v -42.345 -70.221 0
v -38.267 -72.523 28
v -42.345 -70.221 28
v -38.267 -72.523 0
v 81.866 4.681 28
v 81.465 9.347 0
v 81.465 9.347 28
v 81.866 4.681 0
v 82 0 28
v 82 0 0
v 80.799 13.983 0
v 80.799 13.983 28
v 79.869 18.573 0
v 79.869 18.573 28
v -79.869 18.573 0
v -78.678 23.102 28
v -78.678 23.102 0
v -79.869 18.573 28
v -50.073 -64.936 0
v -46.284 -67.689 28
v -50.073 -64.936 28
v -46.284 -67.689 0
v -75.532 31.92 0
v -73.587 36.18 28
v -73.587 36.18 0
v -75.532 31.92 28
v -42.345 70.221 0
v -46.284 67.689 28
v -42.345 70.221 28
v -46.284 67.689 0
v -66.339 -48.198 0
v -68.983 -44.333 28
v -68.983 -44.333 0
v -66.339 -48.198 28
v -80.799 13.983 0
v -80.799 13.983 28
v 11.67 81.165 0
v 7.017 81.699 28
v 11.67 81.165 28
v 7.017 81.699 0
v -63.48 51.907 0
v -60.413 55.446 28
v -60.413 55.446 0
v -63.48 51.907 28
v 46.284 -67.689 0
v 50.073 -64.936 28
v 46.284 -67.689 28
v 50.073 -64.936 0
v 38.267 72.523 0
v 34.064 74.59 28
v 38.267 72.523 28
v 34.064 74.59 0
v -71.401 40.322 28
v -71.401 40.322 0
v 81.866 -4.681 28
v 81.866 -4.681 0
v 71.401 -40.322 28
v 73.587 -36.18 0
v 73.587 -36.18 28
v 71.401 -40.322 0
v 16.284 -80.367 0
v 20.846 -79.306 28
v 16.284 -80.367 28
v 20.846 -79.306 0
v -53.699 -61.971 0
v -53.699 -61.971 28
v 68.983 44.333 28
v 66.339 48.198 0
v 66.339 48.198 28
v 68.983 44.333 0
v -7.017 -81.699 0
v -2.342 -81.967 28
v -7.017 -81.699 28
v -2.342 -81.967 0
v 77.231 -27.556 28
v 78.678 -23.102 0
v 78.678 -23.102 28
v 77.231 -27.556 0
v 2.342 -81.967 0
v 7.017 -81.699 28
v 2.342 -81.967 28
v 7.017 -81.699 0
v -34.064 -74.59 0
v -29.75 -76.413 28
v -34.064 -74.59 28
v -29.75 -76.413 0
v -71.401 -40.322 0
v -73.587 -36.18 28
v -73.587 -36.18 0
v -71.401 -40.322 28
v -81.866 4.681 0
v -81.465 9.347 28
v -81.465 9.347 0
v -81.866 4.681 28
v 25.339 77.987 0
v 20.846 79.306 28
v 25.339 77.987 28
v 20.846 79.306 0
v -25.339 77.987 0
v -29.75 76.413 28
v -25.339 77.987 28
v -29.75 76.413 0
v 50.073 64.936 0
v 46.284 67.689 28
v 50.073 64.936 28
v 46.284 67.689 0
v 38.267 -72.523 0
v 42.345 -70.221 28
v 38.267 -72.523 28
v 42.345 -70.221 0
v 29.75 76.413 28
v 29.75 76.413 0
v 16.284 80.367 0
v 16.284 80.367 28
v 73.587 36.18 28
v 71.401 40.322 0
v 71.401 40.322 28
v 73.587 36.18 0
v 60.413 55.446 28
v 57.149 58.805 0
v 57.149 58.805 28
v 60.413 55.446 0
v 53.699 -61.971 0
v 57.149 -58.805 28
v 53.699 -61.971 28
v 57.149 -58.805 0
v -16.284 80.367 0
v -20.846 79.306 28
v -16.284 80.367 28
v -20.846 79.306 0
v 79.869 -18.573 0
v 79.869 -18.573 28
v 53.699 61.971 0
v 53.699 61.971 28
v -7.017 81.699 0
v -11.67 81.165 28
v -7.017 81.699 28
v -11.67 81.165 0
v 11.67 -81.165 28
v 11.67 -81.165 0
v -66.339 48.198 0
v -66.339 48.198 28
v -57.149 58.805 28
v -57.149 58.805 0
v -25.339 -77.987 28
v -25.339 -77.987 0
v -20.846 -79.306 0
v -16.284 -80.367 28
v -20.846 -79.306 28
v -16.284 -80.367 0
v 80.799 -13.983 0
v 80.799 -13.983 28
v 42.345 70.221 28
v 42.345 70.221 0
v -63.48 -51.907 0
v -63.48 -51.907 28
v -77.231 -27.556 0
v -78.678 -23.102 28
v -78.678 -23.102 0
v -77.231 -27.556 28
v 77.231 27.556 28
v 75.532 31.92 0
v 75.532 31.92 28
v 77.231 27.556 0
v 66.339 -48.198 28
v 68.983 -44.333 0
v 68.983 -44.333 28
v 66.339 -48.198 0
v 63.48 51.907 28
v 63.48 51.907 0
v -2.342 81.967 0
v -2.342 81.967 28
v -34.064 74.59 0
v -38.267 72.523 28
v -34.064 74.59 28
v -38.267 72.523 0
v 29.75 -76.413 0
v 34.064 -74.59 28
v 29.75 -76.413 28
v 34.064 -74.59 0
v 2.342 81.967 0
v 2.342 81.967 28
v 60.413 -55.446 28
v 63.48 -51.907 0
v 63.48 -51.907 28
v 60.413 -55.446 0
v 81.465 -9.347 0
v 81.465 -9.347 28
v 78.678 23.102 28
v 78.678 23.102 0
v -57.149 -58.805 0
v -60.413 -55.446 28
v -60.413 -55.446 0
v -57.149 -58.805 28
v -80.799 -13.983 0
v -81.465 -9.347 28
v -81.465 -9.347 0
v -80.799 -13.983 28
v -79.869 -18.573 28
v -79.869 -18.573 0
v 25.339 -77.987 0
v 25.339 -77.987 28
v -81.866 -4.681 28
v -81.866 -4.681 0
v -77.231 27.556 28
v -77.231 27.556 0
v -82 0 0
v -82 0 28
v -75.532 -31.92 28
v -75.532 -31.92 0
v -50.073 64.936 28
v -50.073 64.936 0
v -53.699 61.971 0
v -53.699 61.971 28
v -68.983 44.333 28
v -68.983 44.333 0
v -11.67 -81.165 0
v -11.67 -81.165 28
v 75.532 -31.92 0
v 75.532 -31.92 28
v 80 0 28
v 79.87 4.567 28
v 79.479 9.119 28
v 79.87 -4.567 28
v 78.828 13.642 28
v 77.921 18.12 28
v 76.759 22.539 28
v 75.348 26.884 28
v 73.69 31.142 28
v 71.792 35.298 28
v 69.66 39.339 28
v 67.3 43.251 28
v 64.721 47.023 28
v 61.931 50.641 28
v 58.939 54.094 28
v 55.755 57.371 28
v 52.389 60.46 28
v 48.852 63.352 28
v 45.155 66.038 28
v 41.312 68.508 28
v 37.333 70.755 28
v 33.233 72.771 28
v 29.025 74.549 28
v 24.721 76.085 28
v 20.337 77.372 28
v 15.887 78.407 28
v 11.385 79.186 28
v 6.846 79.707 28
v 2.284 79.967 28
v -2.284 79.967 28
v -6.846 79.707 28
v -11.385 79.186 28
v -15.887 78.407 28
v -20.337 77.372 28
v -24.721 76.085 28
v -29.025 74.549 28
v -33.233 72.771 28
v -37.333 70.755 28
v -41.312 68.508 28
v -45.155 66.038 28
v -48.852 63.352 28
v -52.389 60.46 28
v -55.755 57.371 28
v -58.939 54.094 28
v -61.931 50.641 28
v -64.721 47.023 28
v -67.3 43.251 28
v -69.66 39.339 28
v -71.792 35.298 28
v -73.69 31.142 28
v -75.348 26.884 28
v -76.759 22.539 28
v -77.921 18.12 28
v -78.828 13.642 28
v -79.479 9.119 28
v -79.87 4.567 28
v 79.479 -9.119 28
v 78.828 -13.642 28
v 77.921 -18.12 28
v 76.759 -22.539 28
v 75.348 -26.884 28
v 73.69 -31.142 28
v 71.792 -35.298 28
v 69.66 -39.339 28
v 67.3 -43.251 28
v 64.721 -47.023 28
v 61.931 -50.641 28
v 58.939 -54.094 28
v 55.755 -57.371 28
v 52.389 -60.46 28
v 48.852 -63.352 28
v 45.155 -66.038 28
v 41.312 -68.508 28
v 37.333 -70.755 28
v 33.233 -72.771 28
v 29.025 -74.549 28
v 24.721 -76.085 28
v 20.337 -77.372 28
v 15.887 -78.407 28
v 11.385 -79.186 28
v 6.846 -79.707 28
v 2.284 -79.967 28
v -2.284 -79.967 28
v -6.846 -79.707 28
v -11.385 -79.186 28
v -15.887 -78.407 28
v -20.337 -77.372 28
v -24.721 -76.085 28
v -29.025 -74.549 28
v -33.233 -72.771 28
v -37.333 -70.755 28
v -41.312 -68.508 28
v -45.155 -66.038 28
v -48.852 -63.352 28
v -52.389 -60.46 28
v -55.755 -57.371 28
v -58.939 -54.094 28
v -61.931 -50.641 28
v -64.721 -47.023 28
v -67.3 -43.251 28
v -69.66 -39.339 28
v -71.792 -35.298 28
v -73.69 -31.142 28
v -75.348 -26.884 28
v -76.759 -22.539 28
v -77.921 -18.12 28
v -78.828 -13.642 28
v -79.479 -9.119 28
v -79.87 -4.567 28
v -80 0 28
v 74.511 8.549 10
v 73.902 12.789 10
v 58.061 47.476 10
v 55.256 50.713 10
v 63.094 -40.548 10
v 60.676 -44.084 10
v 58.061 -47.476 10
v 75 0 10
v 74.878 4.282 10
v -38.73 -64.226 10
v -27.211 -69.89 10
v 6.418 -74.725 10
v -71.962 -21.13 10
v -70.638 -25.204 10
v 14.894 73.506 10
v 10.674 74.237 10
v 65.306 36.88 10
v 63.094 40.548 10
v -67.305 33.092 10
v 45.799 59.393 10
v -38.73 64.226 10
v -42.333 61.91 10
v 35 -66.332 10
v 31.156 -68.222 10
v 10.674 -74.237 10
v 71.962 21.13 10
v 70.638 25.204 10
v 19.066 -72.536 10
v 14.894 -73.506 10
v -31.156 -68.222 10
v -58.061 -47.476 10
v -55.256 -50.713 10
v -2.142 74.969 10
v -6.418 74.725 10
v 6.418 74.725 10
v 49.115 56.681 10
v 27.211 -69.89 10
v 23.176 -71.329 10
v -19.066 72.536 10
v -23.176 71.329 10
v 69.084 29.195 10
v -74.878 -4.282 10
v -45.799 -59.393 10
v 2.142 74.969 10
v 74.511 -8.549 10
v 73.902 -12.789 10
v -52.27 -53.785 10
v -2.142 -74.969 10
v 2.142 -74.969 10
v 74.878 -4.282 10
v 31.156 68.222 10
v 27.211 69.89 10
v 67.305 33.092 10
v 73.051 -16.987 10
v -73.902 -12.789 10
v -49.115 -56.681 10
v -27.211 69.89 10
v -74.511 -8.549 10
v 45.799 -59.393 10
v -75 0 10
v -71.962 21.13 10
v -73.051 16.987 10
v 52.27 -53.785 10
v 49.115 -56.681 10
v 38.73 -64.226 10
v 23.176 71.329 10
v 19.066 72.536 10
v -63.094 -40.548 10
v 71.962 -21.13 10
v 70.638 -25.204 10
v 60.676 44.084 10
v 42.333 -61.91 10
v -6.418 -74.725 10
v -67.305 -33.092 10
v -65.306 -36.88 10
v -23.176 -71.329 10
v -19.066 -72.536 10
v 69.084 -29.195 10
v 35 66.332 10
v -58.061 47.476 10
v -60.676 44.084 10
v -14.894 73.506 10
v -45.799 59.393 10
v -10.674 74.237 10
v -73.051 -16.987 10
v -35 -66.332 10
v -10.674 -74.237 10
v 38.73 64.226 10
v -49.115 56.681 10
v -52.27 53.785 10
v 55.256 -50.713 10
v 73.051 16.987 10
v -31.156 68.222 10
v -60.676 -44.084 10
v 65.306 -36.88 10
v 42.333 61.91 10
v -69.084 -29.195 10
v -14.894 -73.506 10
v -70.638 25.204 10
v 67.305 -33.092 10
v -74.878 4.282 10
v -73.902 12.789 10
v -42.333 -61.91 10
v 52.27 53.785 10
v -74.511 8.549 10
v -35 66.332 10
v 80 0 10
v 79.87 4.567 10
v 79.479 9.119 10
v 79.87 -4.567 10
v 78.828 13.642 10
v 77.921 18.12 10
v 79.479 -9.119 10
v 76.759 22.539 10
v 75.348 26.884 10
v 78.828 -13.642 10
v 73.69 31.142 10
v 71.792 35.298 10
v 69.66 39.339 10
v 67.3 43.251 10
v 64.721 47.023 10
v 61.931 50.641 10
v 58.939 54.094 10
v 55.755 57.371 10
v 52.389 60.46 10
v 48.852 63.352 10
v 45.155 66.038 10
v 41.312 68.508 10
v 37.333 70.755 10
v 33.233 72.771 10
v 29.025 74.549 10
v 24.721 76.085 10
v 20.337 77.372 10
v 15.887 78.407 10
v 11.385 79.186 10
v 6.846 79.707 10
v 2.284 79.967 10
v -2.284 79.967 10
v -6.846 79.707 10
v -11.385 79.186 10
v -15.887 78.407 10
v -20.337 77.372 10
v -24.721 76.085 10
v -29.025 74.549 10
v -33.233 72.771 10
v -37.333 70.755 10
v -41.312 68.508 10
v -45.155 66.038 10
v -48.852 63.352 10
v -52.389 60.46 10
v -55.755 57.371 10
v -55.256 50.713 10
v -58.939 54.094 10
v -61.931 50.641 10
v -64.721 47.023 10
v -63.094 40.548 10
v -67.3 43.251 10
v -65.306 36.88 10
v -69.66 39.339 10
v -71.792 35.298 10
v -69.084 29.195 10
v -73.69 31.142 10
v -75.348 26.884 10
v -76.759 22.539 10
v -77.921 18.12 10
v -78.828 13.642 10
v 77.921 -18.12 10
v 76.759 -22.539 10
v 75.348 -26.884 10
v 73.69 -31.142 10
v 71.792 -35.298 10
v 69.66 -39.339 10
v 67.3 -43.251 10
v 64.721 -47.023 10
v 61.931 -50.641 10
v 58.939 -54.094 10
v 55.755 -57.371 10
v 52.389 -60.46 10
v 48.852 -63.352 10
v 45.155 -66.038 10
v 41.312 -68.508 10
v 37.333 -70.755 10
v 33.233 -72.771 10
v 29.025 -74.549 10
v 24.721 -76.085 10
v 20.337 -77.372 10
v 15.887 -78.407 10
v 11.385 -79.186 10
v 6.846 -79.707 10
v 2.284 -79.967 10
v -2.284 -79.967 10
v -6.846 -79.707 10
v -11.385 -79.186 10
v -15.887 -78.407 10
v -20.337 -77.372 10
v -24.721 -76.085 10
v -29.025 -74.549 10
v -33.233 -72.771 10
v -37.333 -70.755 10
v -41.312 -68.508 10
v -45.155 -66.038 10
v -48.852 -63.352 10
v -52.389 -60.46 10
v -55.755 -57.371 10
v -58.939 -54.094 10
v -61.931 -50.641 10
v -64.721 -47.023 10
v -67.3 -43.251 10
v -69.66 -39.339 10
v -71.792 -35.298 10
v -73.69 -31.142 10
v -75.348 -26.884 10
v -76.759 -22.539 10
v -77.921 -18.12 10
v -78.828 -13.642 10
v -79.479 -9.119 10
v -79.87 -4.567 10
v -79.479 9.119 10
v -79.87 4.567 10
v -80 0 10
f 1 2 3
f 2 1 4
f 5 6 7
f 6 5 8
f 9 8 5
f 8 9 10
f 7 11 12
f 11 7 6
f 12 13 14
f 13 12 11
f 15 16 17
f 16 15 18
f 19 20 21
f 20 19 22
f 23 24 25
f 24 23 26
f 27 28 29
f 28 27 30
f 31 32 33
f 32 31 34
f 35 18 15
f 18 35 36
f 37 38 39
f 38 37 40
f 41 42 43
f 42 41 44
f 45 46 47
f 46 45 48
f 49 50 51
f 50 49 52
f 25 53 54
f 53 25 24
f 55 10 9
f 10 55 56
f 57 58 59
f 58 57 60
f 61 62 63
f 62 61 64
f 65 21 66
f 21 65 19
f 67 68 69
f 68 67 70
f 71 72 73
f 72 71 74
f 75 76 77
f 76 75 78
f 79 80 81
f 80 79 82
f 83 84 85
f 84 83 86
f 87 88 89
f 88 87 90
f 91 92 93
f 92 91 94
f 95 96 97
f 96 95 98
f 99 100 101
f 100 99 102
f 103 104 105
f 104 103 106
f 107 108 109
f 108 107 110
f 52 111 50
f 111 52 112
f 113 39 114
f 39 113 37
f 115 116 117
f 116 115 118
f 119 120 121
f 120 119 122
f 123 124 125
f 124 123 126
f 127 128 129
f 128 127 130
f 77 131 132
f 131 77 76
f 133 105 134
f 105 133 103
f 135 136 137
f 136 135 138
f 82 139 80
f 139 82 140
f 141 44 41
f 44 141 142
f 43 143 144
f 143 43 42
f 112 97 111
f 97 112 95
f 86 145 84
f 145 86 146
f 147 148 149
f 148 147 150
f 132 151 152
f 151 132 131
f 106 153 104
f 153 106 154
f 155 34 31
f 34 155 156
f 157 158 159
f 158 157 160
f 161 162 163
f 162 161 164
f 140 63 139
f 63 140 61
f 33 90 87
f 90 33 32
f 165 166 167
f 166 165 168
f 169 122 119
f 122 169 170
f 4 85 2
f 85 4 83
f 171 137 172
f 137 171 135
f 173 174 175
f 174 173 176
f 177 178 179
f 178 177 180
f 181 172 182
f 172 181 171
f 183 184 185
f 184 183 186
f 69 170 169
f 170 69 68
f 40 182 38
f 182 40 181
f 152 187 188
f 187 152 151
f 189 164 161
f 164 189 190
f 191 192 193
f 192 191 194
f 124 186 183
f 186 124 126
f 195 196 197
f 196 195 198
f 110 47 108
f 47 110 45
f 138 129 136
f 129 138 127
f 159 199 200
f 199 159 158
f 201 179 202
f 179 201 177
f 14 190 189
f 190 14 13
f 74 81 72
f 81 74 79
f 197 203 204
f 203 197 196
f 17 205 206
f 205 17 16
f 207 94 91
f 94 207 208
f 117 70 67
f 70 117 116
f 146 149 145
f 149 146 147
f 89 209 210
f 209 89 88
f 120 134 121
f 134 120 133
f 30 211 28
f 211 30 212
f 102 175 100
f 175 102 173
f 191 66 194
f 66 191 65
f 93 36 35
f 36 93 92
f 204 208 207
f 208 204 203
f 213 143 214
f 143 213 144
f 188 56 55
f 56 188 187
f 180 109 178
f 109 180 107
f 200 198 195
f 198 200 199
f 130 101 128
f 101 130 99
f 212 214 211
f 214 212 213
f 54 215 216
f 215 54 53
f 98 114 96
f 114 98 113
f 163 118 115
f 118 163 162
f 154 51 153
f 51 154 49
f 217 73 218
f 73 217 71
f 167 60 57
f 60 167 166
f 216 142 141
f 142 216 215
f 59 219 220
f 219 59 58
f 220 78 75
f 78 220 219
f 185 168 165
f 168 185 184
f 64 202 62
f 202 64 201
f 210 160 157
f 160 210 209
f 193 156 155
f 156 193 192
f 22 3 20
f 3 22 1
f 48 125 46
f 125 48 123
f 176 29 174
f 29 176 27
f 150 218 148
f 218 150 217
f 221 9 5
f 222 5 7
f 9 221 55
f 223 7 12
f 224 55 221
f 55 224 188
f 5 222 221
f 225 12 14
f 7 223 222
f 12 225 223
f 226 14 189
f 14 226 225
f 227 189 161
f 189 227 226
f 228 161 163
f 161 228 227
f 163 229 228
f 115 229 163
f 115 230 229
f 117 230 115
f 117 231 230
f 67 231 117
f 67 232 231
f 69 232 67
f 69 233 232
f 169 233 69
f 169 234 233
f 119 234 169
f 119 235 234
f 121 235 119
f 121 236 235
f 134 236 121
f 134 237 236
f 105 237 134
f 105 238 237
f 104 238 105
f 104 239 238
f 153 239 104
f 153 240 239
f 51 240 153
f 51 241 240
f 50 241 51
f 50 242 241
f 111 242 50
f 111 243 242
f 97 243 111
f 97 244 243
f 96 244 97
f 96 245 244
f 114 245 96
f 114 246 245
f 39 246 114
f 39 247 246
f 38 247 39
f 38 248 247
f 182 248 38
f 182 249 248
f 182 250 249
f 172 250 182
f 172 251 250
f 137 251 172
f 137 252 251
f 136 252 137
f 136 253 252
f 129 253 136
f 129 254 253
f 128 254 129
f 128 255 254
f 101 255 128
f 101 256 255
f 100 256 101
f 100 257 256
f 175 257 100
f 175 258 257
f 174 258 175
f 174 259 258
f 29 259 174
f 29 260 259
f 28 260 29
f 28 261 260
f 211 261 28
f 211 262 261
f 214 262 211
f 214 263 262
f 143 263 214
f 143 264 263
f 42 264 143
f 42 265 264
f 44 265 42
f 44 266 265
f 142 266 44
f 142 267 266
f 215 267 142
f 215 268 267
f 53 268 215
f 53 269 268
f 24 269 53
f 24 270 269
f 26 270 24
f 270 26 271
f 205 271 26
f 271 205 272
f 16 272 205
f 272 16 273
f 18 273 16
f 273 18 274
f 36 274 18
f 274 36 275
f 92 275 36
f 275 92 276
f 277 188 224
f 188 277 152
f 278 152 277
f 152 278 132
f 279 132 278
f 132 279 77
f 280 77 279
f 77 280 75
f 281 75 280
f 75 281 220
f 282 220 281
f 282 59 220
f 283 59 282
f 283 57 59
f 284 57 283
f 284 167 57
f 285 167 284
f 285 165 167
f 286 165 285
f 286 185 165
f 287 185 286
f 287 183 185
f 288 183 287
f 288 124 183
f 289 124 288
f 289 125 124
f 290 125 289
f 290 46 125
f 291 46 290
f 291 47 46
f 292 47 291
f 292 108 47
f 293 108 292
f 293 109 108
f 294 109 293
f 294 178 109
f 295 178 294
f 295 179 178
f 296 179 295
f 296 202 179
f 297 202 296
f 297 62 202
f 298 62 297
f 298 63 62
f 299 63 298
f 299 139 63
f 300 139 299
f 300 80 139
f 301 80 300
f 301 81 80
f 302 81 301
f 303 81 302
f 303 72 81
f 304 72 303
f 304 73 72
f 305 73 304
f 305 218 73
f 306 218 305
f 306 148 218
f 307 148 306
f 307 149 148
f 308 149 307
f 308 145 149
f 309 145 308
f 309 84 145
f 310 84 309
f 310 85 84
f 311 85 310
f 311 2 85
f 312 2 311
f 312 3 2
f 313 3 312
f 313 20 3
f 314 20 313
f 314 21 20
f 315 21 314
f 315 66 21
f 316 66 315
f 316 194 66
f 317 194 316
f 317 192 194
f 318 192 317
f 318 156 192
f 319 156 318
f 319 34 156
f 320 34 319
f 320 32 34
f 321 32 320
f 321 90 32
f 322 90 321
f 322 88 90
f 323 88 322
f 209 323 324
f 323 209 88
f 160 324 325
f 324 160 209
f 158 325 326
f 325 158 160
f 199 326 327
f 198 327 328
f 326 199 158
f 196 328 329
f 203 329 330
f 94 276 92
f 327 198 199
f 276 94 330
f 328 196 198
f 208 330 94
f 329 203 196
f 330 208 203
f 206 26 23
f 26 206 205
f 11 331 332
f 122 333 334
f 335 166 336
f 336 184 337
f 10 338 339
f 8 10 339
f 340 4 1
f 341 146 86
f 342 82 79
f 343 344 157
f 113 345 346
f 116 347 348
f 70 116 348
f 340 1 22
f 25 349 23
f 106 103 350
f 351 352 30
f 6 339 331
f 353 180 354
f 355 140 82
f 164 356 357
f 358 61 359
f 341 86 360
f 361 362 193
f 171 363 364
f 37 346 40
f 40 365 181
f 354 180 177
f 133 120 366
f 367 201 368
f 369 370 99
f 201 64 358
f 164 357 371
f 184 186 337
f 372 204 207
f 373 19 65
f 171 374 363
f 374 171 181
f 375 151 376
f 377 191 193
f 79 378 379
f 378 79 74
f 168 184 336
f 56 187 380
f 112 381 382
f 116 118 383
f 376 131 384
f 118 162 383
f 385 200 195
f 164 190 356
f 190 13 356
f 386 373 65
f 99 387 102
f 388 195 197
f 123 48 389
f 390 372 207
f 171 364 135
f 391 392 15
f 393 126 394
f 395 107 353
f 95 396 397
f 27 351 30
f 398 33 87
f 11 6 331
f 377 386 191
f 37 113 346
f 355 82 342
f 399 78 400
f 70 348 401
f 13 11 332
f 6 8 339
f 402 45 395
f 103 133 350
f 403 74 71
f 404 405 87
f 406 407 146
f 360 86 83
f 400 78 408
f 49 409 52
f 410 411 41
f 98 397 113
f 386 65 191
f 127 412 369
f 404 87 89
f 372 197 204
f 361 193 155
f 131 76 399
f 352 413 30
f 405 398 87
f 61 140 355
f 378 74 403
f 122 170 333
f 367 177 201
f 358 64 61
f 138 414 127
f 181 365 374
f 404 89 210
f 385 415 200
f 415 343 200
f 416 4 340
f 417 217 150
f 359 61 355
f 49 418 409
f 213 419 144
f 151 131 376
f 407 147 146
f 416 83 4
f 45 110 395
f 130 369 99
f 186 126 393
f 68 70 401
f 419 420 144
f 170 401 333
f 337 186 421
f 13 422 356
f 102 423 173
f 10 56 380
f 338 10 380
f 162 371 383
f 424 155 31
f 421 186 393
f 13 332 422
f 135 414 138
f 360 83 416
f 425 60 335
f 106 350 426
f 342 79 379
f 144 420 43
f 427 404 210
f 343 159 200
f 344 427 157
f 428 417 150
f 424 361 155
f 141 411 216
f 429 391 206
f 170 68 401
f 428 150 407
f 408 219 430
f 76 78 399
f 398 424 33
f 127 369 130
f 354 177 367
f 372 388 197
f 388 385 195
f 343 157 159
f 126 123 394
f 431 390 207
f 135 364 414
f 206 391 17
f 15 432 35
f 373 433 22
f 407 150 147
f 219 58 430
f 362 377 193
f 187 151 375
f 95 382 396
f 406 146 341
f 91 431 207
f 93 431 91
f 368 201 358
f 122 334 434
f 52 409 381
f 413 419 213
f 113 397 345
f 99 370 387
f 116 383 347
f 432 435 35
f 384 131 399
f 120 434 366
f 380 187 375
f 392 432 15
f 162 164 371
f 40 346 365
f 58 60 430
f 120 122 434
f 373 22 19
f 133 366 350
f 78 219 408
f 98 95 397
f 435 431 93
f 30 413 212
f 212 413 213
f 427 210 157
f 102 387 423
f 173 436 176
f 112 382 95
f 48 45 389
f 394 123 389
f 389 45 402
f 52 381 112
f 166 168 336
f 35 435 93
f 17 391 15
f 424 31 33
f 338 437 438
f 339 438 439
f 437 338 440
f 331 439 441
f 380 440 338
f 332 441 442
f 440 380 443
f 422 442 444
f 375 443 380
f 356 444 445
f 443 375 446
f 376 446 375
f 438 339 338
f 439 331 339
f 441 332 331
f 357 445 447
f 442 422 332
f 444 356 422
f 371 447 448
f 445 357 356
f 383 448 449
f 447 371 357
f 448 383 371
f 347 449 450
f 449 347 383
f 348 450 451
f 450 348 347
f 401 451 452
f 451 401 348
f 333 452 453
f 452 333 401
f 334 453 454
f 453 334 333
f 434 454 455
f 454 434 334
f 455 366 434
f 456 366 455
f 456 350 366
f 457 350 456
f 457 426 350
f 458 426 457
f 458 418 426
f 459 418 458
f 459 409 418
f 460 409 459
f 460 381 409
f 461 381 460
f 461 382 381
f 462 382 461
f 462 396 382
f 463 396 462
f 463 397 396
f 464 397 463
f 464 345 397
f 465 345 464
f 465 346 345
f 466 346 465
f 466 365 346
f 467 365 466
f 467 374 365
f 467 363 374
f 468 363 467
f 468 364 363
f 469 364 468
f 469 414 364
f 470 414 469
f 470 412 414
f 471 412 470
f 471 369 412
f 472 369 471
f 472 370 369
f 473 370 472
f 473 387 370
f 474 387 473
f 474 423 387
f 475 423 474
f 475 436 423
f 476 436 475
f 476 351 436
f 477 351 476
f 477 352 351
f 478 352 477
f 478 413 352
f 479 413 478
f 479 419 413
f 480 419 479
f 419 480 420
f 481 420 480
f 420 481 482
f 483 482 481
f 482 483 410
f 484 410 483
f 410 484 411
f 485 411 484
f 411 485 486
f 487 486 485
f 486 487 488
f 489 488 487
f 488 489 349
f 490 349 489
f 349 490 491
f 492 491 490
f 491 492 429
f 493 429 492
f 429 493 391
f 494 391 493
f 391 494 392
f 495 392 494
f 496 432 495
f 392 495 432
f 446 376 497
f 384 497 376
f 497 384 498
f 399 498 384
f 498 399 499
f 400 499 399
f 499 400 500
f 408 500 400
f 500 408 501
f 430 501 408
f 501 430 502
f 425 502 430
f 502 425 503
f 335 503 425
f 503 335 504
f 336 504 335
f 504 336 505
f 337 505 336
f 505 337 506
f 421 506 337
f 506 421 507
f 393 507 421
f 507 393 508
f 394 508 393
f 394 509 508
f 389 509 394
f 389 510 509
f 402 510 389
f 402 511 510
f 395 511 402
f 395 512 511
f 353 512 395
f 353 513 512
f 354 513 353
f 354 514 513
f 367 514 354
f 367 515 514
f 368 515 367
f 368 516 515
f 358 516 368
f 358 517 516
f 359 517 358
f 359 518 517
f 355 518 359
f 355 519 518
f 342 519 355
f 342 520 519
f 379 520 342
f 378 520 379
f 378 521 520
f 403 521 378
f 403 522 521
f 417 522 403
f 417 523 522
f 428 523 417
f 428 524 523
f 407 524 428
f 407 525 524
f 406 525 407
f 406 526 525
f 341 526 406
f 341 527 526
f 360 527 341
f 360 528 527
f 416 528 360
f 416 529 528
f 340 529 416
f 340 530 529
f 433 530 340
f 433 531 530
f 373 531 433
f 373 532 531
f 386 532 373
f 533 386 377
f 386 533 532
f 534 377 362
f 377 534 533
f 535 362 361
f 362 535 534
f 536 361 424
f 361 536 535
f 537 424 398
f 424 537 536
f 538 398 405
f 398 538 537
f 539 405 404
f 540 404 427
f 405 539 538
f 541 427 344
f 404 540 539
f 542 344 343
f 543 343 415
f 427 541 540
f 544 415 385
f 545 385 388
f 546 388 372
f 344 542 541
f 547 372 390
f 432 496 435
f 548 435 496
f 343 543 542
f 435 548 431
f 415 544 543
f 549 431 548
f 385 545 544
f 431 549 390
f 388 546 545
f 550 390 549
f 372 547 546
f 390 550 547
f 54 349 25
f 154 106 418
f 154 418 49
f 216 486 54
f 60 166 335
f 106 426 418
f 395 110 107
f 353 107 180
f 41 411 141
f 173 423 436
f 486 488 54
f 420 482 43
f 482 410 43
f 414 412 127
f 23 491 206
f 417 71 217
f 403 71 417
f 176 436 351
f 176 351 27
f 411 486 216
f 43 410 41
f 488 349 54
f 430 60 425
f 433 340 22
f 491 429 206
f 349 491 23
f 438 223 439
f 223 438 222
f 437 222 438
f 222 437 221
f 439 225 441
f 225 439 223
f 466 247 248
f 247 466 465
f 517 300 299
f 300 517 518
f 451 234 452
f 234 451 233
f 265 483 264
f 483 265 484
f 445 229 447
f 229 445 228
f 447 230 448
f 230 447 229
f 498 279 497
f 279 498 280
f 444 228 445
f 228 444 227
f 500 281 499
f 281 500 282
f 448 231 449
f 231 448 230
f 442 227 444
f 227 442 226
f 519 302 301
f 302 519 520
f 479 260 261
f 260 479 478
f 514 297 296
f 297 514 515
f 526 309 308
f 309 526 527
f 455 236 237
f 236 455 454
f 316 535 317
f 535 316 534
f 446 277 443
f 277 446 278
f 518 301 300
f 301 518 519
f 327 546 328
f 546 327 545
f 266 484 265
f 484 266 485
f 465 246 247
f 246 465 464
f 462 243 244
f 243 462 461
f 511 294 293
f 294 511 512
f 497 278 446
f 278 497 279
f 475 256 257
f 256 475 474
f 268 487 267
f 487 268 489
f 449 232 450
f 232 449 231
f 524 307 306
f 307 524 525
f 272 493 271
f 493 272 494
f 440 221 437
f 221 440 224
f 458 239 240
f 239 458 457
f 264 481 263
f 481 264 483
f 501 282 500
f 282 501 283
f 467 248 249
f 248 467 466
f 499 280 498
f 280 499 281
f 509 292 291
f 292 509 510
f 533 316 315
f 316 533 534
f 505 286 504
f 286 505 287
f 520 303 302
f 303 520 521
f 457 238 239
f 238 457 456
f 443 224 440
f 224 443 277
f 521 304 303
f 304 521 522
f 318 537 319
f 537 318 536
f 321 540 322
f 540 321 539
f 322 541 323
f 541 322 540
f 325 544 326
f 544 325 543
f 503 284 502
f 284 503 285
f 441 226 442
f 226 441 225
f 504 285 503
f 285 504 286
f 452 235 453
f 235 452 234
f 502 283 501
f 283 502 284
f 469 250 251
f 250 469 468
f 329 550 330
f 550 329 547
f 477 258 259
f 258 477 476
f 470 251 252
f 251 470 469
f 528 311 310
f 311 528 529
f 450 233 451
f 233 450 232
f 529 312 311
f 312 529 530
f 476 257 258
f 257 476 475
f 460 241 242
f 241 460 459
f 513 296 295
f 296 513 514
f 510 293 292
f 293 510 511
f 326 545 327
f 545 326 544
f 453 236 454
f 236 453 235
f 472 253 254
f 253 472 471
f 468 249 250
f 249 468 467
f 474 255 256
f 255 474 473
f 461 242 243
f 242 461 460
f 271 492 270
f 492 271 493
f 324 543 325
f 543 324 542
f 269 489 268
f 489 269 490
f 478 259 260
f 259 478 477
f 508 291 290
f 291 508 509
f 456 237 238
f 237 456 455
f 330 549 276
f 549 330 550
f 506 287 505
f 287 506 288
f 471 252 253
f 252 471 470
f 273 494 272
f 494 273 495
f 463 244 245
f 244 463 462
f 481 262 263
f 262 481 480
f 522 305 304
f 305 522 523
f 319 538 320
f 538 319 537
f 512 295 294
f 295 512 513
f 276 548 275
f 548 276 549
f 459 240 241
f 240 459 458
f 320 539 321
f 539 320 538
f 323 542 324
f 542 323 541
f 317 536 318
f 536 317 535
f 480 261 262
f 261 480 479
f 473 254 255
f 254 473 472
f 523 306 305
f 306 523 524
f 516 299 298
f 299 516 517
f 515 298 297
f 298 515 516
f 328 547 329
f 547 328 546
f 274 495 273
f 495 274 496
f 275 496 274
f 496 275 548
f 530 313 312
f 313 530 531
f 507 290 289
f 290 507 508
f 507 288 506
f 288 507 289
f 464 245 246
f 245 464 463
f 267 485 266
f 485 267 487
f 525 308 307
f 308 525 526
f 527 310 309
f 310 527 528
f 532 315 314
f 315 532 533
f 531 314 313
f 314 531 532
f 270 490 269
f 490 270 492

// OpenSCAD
//luftrör
h1=10;
h2=18;
ytterradie=82;
innerradie=80;
klackradie=75;
res=110;

difference(){
	cylinder(h=h1+h2, r=ytterradie, $fn=res);
	cylinder(h=h1, r1=ytterradie, r2=klackradie, $fn=res);
	translate([0,0,h1])
	cylinder(h=h2, r=innerradie, $fn=res);
}
